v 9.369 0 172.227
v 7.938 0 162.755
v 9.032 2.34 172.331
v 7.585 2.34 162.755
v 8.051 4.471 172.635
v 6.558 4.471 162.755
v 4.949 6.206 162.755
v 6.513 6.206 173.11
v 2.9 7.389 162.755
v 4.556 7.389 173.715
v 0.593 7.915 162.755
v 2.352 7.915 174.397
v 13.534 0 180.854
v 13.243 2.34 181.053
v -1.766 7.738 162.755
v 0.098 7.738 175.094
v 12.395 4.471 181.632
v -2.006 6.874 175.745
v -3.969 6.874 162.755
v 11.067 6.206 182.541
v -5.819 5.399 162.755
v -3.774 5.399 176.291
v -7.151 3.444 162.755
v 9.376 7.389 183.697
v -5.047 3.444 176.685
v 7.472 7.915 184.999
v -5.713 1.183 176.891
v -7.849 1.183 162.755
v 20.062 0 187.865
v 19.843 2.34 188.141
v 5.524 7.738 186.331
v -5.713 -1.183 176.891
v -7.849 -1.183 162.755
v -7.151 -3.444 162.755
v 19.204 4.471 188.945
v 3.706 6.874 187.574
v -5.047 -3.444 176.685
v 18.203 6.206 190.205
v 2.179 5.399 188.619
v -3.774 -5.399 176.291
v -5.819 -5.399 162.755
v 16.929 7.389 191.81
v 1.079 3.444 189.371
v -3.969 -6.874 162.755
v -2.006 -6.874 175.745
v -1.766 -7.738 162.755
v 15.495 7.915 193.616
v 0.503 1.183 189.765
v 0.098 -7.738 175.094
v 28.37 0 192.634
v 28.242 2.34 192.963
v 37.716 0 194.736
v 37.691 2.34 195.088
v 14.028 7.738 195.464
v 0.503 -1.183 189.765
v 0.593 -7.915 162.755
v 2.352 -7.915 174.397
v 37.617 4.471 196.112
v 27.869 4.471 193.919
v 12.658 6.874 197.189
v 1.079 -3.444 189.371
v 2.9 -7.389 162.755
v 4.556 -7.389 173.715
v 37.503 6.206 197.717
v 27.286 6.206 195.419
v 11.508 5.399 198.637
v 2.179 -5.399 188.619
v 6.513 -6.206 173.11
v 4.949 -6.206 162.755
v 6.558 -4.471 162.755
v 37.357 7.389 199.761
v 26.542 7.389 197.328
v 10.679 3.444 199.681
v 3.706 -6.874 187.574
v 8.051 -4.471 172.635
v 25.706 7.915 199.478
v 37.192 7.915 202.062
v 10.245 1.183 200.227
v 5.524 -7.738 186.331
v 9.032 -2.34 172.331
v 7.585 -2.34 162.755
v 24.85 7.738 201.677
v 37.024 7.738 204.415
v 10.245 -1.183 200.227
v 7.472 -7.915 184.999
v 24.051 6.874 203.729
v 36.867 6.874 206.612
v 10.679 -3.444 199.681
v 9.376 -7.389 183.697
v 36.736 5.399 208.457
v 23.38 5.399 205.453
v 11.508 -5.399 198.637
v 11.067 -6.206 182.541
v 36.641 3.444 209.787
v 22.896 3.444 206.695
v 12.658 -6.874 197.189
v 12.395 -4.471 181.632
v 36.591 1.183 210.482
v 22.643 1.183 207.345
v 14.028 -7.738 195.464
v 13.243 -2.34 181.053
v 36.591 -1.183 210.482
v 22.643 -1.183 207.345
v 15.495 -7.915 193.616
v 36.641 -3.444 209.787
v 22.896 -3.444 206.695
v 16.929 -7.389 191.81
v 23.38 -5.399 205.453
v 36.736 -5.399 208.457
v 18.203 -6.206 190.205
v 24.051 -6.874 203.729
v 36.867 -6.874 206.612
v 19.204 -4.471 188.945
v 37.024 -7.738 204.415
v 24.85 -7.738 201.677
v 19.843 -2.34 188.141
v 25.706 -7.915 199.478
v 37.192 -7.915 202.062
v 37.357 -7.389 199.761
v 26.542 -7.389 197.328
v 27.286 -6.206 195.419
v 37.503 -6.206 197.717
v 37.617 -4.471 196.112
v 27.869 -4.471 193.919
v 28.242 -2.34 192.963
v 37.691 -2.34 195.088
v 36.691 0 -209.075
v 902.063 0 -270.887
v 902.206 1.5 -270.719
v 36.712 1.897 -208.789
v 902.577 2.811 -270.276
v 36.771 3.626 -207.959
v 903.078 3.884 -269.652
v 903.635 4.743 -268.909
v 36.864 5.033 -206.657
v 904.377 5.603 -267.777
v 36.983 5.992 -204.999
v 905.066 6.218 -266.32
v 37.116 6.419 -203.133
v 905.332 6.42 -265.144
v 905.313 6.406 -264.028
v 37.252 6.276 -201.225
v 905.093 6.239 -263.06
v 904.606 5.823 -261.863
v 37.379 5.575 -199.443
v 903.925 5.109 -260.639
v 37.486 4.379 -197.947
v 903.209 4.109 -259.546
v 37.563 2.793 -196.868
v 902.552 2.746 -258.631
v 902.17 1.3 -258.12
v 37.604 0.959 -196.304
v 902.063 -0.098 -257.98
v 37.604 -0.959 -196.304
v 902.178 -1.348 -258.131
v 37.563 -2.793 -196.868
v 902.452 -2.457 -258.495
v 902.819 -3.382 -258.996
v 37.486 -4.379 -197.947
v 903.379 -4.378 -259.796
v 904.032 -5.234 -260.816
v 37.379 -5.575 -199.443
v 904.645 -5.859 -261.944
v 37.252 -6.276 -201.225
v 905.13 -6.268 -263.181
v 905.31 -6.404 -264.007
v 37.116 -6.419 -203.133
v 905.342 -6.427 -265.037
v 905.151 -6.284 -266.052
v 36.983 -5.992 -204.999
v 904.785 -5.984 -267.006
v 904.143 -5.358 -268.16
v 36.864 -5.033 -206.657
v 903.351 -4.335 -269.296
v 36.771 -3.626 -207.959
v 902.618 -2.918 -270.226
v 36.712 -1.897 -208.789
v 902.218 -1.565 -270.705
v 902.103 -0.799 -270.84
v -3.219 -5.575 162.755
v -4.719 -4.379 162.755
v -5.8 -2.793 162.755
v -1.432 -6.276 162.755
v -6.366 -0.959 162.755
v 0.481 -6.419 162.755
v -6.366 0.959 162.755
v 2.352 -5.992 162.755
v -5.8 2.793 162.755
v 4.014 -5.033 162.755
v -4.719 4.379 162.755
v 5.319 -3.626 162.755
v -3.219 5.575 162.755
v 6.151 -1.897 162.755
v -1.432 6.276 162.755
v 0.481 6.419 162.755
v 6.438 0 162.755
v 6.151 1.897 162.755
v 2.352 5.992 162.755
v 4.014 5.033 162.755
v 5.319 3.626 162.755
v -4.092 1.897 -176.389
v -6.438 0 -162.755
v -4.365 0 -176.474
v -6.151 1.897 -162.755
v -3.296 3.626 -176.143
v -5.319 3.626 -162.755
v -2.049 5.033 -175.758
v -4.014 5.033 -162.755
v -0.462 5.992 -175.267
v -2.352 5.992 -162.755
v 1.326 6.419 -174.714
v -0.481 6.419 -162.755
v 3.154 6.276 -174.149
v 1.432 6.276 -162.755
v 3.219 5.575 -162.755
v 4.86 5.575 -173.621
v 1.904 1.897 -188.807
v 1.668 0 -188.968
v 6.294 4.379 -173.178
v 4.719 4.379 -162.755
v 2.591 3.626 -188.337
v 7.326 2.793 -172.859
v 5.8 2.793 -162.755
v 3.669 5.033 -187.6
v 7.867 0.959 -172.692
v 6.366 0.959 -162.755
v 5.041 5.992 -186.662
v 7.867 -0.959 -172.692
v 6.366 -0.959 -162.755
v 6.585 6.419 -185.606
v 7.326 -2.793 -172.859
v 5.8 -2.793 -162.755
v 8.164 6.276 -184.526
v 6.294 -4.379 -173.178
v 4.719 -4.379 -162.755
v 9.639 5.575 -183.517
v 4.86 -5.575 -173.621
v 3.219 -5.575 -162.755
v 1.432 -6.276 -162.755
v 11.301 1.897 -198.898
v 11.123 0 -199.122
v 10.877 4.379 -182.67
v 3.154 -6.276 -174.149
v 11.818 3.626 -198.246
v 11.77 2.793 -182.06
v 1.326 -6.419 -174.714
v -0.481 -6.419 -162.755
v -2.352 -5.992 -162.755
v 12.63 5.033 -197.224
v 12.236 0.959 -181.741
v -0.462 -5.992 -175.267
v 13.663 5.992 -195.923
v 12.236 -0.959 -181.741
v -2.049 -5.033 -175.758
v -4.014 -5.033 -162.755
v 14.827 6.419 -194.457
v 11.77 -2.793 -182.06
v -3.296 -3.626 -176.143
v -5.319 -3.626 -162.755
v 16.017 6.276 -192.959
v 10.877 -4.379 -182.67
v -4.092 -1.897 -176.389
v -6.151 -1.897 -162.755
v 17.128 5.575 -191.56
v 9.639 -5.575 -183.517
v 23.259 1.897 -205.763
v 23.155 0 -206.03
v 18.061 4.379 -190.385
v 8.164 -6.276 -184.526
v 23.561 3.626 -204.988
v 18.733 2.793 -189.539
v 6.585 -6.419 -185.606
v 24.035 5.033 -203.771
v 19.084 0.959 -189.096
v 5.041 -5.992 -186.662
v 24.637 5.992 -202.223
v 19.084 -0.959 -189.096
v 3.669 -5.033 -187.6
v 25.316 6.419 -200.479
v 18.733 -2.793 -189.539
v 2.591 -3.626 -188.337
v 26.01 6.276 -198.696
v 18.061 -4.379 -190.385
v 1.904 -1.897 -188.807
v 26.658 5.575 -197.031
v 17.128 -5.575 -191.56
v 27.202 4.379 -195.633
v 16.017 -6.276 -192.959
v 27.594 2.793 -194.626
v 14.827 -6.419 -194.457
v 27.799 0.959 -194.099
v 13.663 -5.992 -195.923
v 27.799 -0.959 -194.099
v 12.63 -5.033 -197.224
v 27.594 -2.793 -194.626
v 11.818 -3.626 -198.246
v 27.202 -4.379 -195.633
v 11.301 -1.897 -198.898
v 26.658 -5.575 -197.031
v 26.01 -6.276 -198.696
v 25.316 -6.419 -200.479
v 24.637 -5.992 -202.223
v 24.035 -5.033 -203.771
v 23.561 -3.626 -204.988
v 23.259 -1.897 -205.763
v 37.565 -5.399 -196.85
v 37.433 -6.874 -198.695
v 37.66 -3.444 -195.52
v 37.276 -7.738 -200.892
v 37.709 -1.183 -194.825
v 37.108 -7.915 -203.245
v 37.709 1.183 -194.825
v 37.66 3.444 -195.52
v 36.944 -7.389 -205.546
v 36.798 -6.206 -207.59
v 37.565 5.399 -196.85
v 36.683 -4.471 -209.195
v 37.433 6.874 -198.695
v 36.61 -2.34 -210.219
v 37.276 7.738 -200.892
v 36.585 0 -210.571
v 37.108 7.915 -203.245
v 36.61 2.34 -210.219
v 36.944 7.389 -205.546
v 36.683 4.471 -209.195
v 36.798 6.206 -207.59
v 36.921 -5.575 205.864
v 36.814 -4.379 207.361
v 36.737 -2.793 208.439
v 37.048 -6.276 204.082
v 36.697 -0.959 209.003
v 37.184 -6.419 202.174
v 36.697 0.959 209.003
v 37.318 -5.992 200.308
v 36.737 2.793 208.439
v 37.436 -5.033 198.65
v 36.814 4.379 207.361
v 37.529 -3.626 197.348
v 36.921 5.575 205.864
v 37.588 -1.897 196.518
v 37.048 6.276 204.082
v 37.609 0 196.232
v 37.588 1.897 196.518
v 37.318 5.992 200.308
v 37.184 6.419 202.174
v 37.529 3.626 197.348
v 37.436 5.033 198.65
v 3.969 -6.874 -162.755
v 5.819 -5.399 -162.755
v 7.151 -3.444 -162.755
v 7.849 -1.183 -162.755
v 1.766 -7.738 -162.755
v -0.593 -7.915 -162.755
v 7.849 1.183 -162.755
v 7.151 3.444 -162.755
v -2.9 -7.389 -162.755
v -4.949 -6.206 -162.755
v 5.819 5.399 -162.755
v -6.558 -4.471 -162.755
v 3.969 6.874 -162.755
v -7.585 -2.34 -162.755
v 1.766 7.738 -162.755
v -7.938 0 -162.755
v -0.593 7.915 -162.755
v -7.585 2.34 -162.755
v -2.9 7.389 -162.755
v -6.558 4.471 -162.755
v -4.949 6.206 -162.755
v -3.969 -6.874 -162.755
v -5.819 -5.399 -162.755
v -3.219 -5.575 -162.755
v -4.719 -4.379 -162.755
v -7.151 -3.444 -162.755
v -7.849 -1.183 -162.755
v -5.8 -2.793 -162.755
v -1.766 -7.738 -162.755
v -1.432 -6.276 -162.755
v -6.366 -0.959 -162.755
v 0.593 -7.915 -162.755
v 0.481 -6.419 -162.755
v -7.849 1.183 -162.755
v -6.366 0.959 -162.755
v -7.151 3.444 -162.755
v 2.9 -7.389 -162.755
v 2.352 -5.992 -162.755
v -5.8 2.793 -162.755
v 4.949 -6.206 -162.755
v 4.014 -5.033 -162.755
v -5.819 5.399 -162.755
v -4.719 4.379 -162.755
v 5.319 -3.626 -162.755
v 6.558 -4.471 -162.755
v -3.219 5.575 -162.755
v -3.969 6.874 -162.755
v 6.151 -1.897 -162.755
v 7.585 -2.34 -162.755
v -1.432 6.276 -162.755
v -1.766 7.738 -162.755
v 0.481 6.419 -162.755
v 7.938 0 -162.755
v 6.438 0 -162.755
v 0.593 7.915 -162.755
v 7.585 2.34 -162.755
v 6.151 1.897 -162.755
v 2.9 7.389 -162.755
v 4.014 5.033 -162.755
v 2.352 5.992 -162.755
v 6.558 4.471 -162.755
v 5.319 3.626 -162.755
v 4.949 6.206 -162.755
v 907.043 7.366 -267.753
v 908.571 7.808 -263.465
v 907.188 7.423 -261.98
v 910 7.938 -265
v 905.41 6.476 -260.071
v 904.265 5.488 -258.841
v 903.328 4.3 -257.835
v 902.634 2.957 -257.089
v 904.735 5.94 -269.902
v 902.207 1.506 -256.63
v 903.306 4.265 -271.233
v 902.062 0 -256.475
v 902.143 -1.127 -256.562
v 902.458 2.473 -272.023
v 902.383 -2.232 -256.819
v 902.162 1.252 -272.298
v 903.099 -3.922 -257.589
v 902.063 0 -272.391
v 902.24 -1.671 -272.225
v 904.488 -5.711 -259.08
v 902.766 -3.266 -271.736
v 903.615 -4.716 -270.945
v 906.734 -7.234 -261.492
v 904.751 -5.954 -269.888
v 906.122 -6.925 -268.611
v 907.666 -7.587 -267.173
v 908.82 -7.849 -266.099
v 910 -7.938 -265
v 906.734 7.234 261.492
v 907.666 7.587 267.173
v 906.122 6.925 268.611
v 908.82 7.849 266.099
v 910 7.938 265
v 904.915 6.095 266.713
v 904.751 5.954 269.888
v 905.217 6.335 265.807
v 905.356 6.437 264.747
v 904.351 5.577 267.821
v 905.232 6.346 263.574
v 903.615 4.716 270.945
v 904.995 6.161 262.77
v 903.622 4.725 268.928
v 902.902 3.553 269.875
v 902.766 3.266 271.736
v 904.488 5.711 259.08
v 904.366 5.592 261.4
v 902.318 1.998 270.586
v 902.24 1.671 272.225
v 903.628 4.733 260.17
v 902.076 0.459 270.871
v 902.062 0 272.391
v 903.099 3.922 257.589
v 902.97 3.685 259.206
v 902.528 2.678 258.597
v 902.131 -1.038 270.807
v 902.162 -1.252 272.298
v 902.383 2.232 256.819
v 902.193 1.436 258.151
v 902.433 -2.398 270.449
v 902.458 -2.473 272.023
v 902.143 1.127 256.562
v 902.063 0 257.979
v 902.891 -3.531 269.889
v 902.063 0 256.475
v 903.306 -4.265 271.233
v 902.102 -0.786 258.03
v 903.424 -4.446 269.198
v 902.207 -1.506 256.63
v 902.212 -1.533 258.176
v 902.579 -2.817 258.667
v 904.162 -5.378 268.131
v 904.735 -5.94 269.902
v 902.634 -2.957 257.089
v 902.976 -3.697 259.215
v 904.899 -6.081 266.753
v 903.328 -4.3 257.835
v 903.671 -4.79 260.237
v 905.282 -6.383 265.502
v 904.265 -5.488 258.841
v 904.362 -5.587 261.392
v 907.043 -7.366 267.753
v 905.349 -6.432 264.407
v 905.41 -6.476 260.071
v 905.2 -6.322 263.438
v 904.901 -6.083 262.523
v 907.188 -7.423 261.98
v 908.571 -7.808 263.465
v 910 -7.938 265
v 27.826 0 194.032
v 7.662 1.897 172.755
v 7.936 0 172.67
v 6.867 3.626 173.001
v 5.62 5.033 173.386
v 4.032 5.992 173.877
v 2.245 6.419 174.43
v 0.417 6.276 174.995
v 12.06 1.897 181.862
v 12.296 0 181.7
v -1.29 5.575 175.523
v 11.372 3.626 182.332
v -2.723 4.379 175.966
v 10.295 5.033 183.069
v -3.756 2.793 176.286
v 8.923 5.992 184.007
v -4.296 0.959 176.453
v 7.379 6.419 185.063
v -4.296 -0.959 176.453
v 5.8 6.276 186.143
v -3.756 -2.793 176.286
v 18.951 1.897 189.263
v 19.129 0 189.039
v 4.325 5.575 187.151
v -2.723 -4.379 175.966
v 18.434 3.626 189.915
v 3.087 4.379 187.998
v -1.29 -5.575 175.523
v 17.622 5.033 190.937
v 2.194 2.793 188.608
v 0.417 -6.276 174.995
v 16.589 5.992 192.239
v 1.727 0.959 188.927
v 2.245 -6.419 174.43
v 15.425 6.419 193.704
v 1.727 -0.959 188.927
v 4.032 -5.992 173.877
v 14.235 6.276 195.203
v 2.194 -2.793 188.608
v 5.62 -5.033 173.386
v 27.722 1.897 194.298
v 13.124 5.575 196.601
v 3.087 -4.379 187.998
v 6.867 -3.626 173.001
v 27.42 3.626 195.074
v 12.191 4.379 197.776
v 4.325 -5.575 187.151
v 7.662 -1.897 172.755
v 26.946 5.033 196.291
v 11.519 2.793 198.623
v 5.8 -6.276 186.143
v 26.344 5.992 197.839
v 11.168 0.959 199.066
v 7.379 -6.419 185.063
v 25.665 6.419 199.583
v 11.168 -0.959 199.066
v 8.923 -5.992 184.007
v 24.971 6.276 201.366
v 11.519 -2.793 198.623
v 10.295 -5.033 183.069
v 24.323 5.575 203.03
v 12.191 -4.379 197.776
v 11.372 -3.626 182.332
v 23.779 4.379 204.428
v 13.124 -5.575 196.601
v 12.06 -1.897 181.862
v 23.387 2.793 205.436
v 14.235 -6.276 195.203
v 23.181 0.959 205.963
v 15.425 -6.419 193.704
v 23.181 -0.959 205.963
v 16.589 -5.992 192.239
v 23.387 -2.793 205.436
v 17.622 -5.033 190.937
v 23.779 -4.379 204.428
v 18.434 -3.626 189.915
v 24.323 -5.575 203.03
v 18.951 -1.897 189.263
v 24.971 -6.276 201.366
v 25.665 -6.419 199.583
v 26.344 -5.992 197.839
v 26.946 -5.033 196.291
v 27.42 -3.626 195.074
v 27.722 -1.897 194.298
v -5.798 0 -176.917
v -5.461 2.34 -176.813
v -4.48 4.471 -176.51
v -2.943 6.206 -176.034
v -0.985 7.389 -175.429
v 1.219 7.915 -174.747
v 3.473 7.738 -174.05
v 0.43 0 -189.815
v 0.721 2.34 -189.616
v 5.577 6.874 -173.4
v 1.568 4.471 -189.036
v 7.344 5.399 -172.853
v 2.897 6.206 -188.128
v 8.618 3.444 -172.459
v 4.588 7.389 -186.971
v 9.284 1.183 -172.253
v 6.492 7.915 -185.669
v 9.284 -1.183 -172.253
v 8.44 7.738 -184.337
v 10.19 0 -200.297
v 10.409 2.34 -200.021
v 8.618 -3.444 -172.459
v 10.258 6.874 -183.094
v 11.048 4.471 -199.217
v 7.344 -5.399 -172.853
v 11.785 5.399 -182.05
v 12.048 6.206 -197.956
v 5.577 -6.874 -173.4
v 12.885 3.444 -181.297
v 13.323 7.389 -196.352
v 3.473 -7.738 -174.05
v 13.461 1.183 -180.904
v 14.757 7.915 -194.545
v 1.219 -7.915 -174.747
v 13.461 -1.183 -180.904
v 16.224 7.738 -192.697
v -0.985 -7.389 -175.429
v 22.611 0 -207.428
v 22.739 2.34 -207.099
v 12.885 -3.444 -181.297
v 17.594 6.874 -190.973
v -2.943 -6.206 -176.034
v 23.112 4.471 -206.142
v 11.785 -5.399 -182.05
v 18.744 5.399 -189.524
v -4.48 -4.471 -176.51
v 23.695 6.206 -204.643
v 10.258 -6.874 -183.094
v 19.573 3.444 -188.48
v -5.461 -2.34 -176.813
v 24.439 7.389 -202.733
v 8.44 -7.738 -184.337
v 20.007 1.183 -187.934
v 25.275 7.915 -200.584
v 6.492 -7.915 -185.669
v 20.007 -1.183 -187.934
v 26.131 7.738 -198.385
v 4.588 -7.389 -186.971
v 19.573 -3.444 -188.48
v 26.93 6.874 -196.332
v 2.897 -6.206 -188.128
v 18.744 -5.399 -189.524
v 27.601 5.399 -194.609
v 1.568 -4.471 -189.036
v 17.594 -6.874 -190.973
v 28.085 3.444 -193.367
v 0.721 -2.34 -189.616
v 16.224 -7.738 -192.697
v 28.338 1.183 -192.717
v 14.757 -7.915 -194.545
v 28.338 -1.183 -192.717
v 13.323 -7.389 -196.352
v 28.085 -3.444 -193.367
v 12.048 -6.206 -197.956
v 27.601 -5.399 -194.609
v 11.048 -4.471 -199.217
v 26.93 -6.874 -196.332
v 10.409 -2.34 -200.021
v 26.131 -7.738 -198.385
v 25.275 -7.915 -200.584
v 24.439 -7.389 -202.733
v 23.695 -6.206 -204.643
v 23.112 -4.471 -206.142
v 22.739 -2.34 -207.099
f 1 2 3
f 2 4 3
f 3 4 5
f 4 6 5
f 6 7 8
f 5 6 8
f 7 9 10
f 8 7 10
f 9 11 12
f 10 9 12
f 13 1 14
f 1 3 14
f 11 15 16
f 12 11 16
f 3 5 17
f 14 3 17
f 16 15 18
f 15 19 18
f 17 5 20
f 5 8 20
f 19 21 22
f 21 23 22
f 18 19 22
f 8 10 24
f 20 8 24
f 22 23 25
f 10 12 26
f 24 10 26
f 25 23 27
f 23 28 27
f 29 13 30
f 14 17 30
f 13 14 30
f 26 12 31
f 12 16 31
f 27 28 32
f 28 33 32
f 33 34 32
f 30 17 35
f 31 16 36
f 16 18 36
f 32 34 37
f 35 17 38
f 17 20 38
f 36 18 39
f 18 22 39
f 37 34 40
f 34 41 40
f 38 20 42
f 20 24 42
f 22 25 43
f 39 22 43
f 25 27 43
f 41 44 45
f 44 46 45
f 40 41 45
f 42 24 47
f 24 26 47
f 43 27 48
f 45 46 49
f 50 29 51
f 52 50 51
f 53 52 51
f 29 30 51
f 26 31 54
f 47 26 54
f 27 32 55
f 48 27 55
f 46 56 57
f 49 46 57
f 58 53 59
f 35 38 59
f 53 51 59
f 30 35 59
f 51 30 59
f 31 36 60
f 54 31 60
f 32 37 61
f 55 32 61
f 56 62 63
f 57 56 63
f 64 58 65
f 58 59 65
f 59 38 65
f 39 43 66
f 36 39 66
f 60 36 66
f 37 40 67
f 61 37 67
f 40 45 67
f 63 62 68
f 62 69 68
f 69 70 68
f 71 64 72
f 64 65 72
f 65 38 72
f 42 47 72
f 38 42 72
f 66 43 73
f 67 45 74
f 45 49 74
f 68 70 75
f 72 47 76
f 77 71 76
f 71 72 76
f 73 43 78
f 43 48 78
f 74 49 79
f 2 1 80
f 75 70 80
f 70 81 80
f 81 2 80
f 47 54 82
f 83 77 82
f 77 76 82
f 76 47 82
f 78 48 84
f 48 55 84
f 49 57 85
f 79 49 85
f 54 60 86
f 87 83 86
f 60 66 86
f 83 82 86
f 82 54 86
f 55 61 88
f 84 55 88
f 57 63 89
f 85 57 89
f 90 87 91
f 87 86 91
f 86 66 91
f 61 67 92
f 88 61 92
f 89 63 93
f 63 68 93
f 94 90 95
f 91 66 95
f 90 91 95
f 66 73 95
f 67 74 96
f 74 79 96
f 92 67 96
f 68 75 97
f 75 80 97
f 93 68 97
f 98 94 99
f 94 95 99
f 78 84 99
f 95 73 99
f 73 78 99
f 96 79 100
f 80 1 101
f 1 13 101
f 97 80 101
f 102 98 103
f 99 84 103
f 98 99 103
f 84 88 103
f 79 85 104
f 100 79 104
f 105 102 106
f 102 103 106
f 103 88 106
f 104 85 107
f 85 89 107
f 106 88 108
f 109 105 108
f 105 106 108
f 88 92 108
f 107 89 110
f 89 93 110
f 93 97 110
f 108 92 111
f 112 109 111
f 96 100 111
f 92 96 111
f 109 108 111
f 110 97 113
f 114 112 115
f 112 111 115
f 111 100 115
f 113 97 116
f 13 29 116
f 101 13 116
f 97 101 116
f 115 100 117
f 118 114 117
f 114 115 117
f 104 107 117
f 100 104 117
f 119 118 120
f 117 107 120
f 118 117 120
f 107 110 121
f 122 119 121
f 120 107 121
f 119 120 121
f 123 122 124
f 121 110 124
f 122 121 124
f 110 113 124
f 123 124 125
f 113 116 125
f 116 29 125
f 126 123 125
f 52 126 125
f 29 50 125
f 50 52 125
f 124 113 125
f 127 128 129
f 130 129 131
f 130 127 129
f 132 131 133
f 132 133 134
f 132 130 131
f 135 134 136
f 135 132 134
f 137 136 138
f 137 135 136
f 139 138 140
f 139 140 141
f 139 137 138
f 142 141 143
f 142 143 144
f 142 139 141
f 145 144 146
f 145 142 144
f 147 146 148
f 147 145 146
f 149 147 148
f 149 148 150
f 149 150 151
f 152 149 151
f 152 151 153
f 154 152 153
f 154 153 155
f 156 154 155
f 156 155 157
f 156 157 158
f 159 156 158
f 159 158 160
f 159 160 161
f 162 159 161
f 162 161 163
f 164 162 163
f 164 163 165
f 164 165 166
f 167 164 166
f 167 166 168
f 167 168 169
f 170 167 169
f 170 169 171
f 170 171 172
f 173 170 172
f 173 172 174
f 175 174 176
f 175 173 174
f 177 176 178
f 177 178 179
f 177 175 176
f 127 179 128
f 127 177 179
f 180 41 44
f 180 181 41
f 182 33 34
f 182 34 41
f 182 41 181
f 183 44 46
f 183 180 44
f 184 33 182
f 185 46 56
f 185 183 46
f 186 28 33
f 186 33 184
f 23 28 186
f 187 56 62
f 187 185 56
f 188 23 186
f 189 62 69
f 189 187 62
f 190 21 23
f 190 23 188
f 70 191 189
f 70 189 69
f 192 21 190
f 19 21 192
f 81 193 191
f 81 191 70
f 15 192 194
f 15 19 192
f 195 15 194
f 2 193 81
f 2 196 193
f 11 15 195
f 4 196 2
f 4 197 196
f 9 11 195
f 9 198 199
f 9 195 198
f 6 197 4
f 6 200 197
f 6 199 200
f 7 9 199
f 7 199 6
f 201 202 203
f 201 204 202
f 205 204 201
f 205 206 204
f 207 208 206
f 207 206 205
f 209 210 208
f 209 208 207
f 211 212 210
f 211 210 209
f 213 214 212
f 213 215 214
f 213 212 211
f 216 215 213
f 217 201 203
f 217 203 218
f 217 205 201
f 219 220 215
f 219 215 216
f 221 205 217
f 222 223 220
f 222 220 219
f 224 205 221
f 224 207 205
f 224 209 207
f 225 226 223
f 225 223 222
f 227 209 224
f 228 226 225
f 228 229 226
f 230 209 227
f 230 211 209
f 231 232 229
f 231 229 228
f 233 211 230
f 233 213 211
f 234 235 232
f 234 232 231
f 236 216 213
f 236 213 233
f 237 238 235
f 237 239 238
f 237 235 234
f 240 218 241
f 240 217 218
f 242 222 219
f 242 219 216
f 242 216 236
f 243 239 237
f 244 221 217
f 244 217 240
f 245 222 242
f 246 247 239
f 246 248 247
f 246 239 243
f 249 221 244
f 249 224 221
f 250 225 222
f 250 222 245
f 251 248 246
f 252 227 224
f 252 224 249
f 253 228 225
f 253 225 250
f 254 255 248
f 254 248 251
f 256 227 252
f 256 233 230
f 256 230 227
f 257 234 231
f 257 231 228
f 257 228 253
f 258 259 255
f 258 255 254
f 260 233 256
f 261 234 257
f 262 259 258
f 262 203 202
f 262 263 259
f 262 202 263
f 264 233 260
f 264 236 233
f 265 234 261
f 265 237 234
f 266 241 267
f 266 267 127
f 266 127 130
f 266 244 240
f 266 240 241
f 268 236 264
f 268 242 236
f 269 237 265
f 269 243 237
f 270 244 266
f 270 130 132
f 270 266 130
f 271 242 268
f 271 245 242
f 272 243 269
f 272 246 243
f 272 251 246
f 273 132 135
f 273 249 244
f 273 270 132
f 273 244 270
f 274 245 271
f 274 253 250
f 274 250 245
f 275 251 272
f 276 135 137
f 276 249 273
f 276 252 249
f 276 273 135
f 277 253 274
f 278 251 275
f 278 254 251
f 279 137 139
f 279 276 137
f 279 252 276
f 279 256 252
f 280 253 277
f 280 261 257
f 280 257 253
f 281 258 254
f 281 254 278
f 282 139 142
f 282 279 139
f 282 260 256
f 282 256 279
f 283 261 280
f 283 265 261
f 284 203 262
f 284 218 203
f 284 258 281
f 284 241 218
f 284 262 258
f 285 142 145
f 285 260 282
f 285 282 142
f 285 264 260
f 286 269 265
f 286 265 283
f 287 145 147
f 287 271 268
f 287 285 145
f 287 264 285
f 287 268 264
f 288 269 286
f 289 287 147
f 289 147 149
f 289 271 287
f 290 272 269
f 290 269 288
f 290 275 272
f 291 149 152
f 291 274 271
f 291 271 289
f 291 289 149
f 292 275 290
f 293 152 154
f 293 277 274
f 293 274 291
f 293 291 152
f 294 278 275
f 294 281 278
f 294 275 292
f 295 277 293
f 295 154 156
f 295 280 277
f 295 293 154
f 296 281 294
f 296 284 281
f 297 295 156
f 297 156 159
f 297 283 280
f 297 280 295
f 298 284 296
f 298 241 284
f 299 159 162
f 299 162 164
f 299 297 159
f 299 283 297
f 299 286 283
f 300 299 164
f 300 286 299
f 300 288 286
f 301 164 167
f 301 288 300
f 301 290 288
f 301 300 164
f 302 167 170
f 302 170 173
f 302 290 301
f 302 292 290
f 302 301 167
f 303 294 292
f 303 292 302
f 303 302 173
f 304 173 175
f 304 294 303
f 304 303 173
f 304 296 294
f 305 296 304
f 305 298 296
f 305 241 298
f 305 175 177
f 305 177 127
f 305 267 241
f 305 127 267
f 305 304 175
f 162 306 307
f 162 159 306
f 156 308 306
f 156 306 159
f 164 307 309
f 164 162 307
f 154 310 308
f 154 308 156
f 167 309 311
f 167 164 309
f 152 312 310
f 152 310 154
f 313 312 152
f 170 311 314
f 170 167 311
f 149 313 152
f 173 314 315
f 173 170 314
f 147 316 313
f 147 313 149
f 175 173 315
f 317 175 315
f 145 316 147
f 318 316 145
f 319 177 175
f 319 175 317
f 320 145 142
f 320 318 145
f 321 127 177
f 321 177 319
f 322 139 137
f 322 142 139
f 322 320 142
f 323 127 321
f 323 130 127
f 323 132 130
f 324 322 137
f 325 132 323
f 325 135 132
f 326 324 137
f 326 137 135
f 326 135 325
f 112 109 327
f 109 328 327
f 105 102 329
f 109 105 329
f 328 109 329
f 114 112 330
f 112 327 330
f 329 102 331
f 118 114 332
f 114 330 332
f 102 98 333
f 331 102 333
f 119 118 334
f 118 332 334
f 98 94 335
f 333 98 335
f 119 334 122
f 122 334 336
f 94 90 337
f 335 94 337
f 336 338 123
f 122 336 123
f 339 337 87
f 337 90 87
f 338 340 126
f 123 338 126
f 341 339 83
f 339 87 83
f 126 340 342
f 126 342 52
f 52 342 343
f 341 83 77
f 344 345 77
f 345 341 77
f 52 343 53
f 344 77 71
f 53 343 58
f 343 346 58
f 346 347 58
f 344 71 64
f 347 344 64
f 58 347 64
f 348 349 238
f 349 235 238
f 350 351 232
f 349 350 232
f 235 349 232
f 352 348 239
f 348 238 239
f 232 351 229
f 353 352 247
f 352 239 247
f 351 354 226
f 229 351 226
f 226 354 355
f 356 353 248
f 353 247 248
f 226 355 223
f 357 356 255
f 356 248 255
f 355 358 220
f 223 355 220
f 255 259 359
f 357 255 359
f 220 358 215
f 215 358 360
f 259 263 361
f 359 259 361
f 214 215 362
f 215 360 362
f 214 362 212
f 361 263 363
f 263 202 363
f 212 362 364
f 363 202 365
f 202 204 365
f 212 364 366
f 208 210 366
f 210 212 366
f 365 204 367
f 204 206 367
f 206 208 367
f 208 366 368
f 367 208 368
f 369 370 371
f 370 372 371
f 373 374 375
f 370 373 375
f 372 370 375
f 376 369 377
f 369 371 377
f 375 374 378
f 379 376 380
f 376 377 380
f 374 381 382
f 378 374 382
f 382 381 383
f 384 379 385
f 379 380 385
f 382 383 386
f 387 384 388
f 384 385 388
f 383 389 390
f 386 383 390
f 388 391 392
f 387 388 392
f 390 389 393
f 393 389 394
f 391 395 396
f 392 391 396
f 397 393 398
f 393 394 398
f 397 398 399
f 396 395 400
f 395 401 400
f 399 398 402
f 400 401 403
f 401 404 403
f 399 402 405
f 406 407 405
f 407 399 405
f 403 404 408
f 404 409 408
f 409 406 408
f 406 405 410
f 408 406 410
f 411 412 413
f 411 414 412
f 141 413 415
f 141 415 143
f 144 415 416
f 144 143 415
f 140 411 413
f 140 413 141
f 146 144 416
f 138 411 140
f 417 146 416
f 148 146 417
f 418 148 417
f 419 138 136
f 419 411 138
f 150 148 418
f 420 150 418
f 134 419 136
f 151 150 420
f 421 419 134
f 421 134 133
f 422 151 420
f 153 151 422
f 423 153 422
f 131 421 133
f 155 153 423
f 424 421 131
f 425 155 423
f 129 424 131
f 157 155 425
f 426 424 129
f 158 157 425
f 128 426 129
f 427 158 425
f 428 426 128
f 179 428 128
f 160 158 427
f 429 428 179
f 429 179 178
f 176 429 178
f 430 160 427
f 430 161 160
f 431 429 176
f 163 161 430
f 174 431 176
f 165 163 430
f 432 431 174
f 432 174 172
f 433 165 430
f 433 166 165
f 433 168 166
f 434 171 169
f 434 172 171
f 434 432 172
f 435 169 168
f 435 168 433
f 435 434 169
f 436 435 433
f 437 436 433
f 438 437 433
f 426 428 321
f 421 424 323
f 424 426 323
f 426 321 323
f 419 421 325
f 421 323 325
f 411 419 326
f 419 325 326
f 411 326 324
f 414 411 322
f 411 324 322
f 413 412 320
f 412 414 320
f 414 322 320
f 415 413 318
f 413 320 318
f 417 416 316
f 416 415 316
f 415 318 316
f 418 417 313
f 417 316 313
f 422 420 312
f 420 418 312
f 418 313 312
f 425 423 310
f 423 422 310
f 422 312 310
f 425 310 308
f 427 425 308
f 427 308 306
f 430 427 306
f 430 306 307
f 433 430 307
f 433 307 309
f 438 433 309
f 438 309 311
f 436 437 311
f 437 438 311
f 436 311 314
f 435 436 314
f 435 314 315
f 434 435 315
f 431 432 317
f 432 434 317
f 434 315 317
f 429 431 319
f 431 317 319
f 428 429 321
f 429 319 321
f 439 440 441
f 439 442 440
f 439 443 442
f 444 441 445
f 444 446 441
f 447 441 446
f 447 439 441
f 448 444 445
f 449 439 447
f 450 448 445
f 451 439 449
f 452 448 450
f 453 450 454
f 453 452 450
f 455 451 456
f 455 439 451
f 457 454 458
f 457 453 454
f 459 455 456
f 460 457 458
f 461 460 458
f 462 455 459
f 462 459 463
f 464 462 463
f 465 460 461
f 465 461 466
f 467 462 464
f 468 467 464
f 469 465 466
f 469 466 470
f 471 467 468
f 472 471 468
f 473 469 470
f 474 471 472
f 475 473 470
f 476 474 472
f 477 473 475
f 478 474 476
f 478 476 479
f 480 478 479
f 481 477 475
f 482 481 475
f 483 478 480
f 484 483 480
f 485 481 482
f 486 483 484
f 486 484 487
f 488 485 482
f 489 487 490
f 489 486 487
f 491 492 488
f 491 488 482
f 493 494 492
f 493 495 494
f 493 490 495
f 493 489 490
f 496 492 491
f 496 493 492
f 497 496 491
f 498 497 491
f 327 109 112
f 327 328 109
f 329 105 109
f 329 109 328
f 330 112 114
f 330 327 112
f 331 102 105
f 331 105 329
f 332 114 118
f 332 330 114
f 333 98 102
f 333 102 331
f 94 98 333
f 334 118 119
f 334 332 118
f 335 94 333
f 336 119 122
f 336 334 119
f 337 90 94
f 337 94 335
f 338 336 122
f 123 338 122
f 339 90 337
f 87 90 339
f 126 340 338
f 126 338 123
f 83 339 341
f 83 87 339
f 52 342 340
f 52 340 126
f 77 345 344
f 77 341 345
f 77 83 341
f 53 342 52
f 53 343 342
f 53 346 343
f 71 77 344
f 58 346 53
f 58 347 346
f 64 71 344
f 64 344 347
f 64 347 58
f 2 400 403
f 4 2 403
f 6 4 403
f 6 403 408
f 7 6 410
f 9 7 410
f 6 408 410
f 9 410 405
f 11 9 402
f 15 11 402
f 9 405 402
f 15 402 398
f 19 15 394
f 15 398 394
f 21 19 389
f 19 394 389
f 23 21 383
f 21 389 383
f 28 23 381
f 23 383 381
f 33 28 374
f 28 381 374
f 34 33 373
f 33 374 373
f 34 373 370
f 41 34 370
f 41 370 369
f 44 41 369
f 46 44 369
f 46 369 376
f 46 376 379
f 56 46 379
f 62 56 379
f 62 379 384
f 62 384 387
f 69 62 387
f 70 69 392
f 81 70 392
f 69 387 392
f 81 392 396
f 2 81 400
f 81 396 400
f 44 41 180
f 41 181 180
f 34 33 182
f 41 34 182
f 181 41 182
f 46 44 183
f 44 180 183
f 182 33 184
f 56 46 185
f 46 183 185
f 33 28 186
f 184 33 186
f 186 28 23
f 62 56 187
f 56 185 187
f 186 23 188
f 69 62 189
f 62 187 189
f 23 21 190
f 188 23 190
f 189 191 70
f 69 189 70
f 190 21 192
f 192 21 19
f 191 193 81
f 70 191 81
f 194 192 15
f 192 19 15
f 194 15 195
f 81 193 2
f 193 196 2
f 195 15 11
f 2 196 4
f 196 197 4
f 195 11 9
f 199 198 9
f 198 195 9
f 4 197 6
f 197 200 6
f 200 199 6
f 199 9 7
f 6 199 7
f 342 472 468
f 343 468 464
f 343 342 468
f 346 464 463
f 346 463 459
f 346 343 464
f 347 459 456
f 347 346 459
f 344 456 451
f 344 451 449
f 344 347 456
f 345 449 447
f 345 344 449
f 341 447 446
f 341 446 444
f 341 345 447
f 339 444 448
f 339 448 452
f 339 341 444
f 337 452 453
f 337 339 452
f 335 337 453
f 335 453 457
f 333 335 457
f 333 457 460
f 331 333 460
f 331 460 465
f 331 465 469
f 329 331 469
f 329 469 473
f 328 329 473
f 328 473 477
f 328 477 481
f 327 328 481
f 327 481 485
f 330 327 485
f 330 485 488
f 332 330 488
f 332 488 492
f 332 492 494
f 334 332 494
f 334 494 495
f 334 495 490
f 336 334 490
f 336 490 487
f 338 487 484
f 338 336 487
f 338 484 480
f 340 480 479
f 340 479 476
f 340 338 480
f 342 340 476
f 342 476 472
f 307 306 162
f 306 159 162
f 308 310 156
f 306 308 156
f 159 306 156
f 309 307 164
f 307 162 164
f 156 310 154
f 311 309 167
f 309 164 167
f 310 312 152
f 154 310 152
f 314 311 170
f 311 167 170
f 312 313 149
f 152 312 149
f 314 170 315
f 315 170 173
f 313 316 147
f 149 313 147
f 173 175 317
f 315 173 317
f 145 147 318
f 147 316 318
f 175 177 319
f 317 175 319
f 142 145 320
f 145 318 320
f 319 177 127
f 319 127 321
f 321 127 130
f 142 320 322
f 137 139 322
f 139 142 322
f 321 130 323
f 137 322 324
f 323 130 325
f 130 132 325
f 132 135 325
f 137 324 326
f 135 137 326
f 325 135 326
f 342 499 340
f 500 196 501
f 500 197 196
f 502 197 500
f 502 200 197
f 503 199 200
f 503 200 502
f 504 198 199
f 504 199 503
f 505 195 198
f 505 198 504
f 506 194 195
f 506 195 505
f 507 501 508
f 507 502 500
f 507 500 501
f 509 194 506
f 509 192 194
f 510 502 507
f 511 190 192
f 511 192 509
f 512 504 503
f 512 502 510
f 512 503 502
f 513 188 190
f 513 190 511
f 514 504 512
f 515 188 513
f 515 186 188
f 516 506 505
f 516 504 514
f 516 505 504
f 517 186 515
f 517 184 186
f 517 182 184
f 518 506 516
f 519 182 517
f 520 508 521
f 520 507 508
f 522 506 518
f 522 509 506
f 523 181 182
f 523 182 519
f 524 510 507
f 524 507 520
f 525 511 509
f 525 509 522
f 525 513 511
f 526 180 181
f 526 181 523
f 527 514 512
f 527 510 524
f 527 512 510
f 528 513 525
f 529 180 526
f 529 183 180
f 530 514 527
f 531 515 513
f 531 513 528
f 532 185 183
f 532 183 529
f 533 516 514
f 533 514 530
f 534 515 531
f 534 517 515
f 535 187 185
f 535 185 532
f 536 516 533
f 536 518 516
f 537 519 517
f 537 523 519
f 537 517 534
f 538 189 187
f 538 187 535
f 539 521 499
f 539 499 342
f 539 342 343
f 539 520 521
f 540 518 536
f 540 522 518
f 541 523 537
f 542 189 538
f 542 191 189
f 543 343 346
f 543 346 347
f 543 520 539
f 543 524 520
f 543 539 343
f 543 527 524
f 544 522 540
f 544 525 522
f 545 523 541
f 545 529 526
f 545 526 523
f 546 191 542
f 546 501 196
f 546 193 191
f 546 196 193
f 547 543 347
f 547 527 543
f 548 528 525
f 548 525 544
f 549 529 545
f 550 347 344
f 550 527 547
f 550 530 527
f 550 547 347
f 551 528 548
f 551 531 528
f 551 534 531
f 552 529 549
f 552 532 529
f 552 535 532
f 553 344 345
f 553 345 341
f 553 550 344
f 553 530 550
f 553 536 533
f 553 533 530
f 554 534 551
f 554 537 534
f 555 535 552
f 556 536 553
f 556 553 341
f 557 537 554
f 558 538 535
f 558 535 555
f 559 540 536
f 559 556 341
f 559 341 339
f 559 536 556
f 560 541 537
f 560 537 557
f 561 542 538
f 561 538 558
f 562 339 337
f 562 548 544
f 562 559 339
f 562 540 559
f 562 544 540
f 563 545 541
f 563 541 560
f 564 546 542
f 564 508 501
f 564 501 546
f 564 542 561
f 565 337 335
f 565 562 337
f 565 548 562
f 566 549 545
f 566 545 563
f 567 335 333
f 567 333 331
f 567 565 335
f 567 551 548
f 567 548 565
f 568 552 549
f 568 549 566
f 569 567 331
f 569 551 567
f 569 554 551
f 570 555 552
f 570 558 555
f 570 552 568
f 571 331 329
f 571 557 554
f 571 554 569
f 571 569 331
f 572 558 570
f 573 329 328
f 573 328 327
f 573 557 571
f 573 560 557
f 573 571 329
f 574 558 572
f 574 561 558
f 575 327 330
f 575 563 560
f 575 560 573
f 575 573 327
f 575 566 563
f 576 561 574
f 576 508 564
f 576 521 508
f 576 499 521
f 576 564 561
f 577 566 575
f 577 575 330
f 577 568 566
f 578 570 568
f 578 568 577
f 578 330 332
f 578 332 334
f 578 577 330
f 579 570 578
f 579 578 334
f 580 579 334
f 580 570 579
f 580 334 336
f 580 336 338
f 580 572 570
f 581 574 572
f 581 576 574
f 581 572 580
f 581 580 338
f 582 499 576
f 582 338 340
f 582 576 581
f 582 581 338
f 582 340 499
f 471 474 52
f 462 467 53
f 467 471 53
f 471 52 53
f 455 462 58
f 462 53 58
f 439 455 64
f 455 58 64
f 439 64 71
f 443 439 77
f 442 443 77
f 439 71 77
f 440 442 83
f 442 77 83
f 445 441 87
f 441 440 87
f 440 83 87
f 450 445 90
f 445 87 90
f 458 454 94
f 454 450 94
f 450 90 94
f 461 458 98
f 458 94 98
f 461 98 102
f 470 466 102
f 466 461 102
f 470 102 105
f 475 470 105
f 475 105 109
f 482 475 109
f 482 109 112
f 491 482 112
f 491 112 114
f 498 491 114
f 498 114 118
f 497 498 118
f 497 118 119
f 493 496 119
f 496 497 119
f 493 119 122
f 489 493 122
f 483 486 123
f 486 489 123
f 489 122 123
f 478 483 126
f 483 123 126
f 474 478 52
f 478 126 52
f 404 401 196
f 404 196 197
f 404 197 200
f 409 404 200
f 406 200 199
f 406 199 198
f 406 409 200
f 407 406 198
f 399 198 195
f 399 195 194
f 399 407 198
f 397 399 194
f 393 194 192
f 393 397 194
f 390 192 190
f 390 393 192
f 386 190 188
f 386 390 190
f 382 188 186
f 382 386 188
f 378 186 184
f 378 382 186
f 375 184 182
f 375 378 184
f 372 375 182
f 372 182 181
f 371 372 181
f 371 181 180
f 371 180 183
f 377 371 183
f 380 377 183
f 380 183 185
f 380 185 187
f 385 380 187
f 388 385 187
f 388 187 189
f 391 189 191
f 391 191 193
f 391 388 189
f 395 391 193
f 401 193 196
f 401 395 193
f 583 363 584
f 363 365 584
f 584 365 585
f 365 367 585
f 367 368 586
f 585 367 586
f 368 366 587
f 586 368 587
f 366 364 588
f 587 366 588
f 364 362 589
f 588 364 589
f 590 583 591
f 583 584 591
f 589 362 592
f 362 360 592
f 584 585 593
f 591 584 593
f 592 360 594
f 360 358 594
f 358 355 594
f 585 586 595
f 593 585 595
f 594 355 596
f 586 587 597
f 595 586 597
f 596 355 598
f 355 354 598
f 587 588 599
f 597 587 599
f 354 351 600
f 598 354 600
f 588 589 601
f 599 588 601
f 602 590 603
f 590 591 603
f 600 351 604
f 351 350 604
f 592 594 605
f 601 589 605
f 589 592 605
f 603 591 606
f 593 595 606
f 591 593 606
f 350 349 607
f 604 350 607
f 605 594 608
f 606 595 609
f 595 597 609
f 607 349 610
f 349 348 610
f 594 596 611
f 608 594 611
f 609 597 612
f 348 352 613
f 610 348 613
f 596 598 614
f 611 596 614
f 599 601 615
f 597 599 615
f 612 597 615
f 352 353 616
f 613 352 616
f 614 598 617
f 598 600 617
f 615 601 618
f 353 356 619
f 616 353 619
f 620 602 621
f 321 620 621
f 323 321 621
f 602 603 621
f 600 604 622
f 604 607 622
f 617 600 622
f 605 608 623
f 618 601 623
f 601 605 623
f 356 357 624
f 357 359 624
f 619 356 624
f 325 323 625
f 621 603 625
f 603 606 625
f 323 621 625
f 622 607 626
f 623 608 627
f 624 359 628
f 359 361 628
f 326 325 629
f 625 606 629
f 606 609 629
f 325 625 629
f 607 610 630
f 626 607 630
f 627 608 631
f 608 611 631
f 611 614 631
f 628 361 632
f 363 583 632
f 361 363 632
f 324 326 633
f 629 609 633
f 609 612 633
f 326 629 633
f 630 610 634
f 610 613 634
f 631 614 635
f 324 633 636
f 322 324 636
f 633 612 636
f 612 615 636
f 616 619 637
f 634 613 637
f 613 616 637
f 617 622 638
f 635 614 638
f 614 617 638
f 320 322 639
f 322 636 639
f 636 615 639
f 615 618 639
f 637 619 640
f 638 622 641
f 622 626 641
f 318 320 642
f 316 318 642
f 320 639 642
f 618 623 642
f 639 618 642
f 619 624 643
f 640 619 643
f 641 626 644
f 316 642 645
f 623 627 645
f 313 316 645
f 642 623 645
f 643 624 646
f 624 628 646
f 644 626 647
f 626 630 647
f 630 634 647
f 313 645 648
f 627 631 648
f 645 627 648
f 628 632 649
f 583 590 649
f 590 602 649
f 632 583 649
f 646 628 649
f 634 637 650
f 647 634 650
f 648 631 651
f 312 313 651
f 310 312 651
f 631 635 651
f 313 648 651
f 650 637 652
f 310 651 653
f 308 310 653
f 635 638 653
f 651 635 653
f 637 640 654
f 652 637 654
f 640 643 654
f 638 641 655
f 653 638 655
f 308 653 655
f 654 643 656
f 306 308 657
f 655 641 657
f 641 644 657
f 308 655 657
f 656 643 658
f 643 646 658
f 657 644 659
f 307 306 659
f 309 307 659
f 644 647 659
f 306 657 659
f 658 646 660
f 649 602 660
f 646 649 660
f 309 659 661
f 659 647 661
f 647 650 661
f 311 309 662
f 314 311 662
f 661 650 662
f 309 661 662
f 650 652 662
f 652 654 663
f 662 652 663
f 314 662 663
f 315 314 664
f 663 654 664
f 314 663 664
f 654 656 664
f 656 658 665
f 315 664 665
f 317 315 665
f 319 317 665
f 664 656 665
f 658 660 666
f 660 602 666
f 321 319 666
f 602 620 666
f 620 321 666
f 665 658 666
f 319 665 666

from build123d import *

# Parameters (mm, degrees)
SKETCH1_ON_SEGMENT_1_R               = 7.9375
SKETCH1_ON_SEGMENT_1_R_2             = 6.4375
PIPE_CONFIGURED_21_3_X_2_3_1_DEPTH   = 875.073706959
SKETCH1_ON_SEGMENT_2_R               = 7.9375
SKETCH1_ON_SEGMENT_2_R_2             = 6.4375
PIPE_CONFIGURED_21_3_X_2_3_1_2_ANGLE = 85.91438322
SKETCH1_ON_SEGMENT_3_R               = 7.9375
SKETCH1_ON_SEGMENT_3_R_2             = 6.4375
PIPE_CONFIGURED_21_3_X_2_3_1_3_DEPTH = 325.510463728
SKETCH1_ON_SEGMENT_4_R               = 7.9375
SKETCH1_ON_SEGMENT_4_R_2             = 6.4375
PIPE_CONFIGURED_21_3_X_2_3_1_4_ANGLE = 85.91438322
SKETCH1_R                            = 7.9375
SKETCH1_R_2                          = 6.4375
PIPE_CONFIGURED_21_3_X_2_3_1_5_DEPTH = 875.073706959
CORTE_EXTRUS_O1_DEPTH                = 951.618979706
CORTE_EXTRUS_O1_DEPTH_BACK           = 951.618979706
ESBO_O2_R                            = 7.9375


with BuildPart() as part:
    # Sketch1 on segment 1 (carried to segment 1) → Pipe - configured 21.3 X 2.3(1) (new body)
    with BuildSketch(Plane(origin=(37.150118, 0, -202.653579857), x_dir=(-0.07124705, 0, -0.9974587), z_dir=(0.9974587, 0, -0.07124705))):
        Circle(SKETCH1_ON_SEGMENT_1_R)
        Circle(SKETCH1_ON_SEGMENT_1_R_2, mode=Mode.SUBTRACT)
    extrude(amount=PIPE_CONFIGURED_21_3_X_2_3_1_DEPTH)


with BuildPart() as body_2:
    # Sketch1 on segment 2 (carried to the start of arc 2) → Pipe - configured 21.3 X 2.3_1 2 (revolve)
    with BuildSketch(Plane(origin=(0, 0, -162.755231864), x_dir=(-1, 0, 0), z_dir=(0, 0, -1))):
        Circle(SKETCH1_ON_SEGMENT_2_R)
        Circle(SKETCH1_ON_SEGMENT_2_R_2, mode=Mode.SUBTRACT)
    revolve(axis=Axis((40, 0, -162.755231864), (0, -1, 0)), revolution_arc=PIPE_CONFIGURED_21_3_X_2_3_1_2_ANGLE)


with BuildPart() as body_3:
    # Sketch1 on segment 3 (carried to segment 3) → Pipe - configured 21.3 X 2.3_1 3 (new body)
    with BuildSketch(Plane.XY.offset(-162.755231864)):
        Circle(SKETCH1_ON_SEGMENT_3_R)
        Circle(SKETCH1_ON_SEGMENT_3_R_2, mode=Mode.SUBTRACT)
    extrude(amount=PIPE_CONFIGURED_21_3_X_2_3_1_3_DEPTH)


with BuildPart() as body_4:
    # Sketch1 on segment 4 (carried to the start of arc 4) → Pipe - configured 21.3 X 2.3_1 4 (revolve)
    with BuildSketch(Plane.XY.offset(162.755231864)):
        Circle(SKETCH1_ON_SEGMENT_4_R)
        Circle(SKETCH1_ON_SEGMENT_4_R_2, mode=Mode.SUBTRACT)
    revolve(axis=Axis((40, 0, 162.755231864), (0, 1, 0)), revolution_arc=PIPE_CONFIGURED_21_3_X_2_3_1_4_ANGLE)


with BuildPart() as body_5:
    # Sketch1 → Pipe - configured 21.3 X 2.3_1 5 (new body)
    with BuildSketch(Plane(origin=(37.150118, 0, 202.653579857), x_dir=(0.07124704998790964, 0, -0.997458699830735), z_dir=(0.997458699830735, 0, 0.07124704998790964))):
        Circle(SKETCH1_R)
        Circle(SKETCH1_R_2, mode=Mode.SUBTRACT)
    extrude(amount=PIPE_CONFIGURED_21_3_X_2_3_1_5_DEPTH)


with BuildPart() as corte_extrus_o1_tool:
    # Esboço2 → Corte-extrusão1 (new, two sides: drawn at the far end of the back side and taken through both)
    with BuildSketch(Plane.XY.offset(-CORTE_EXTRUS_O1_DEPTH_BACK)):
        with Locations((910, 0)):
            Circle(ESBO_O2_R)
    extrude(amount=CORTE_EXTRUS_O1_DEPTH + CORTE_EXTRUS_O1_DEPTH_BACK)


with BuildPart() as part_1:
    add(part.part)

    # Corte-extrusão1: cut by corte_extrus_o1_tool
    add(corte_extrus_o1_tool.part, mode=Mode.SUBTRACT)


with BuildPart() as body_5_1:
    add(body_5.part)

    # Corte-extrusão1: cut by corte_extrus_o1_tool
    add(corte_extrus_o1_tool.part, mode=Mode.SUBTRACT)


solid = Compound([body_2.part, body_3.part, body_4.part, part_1.part, body_5_1.part])
